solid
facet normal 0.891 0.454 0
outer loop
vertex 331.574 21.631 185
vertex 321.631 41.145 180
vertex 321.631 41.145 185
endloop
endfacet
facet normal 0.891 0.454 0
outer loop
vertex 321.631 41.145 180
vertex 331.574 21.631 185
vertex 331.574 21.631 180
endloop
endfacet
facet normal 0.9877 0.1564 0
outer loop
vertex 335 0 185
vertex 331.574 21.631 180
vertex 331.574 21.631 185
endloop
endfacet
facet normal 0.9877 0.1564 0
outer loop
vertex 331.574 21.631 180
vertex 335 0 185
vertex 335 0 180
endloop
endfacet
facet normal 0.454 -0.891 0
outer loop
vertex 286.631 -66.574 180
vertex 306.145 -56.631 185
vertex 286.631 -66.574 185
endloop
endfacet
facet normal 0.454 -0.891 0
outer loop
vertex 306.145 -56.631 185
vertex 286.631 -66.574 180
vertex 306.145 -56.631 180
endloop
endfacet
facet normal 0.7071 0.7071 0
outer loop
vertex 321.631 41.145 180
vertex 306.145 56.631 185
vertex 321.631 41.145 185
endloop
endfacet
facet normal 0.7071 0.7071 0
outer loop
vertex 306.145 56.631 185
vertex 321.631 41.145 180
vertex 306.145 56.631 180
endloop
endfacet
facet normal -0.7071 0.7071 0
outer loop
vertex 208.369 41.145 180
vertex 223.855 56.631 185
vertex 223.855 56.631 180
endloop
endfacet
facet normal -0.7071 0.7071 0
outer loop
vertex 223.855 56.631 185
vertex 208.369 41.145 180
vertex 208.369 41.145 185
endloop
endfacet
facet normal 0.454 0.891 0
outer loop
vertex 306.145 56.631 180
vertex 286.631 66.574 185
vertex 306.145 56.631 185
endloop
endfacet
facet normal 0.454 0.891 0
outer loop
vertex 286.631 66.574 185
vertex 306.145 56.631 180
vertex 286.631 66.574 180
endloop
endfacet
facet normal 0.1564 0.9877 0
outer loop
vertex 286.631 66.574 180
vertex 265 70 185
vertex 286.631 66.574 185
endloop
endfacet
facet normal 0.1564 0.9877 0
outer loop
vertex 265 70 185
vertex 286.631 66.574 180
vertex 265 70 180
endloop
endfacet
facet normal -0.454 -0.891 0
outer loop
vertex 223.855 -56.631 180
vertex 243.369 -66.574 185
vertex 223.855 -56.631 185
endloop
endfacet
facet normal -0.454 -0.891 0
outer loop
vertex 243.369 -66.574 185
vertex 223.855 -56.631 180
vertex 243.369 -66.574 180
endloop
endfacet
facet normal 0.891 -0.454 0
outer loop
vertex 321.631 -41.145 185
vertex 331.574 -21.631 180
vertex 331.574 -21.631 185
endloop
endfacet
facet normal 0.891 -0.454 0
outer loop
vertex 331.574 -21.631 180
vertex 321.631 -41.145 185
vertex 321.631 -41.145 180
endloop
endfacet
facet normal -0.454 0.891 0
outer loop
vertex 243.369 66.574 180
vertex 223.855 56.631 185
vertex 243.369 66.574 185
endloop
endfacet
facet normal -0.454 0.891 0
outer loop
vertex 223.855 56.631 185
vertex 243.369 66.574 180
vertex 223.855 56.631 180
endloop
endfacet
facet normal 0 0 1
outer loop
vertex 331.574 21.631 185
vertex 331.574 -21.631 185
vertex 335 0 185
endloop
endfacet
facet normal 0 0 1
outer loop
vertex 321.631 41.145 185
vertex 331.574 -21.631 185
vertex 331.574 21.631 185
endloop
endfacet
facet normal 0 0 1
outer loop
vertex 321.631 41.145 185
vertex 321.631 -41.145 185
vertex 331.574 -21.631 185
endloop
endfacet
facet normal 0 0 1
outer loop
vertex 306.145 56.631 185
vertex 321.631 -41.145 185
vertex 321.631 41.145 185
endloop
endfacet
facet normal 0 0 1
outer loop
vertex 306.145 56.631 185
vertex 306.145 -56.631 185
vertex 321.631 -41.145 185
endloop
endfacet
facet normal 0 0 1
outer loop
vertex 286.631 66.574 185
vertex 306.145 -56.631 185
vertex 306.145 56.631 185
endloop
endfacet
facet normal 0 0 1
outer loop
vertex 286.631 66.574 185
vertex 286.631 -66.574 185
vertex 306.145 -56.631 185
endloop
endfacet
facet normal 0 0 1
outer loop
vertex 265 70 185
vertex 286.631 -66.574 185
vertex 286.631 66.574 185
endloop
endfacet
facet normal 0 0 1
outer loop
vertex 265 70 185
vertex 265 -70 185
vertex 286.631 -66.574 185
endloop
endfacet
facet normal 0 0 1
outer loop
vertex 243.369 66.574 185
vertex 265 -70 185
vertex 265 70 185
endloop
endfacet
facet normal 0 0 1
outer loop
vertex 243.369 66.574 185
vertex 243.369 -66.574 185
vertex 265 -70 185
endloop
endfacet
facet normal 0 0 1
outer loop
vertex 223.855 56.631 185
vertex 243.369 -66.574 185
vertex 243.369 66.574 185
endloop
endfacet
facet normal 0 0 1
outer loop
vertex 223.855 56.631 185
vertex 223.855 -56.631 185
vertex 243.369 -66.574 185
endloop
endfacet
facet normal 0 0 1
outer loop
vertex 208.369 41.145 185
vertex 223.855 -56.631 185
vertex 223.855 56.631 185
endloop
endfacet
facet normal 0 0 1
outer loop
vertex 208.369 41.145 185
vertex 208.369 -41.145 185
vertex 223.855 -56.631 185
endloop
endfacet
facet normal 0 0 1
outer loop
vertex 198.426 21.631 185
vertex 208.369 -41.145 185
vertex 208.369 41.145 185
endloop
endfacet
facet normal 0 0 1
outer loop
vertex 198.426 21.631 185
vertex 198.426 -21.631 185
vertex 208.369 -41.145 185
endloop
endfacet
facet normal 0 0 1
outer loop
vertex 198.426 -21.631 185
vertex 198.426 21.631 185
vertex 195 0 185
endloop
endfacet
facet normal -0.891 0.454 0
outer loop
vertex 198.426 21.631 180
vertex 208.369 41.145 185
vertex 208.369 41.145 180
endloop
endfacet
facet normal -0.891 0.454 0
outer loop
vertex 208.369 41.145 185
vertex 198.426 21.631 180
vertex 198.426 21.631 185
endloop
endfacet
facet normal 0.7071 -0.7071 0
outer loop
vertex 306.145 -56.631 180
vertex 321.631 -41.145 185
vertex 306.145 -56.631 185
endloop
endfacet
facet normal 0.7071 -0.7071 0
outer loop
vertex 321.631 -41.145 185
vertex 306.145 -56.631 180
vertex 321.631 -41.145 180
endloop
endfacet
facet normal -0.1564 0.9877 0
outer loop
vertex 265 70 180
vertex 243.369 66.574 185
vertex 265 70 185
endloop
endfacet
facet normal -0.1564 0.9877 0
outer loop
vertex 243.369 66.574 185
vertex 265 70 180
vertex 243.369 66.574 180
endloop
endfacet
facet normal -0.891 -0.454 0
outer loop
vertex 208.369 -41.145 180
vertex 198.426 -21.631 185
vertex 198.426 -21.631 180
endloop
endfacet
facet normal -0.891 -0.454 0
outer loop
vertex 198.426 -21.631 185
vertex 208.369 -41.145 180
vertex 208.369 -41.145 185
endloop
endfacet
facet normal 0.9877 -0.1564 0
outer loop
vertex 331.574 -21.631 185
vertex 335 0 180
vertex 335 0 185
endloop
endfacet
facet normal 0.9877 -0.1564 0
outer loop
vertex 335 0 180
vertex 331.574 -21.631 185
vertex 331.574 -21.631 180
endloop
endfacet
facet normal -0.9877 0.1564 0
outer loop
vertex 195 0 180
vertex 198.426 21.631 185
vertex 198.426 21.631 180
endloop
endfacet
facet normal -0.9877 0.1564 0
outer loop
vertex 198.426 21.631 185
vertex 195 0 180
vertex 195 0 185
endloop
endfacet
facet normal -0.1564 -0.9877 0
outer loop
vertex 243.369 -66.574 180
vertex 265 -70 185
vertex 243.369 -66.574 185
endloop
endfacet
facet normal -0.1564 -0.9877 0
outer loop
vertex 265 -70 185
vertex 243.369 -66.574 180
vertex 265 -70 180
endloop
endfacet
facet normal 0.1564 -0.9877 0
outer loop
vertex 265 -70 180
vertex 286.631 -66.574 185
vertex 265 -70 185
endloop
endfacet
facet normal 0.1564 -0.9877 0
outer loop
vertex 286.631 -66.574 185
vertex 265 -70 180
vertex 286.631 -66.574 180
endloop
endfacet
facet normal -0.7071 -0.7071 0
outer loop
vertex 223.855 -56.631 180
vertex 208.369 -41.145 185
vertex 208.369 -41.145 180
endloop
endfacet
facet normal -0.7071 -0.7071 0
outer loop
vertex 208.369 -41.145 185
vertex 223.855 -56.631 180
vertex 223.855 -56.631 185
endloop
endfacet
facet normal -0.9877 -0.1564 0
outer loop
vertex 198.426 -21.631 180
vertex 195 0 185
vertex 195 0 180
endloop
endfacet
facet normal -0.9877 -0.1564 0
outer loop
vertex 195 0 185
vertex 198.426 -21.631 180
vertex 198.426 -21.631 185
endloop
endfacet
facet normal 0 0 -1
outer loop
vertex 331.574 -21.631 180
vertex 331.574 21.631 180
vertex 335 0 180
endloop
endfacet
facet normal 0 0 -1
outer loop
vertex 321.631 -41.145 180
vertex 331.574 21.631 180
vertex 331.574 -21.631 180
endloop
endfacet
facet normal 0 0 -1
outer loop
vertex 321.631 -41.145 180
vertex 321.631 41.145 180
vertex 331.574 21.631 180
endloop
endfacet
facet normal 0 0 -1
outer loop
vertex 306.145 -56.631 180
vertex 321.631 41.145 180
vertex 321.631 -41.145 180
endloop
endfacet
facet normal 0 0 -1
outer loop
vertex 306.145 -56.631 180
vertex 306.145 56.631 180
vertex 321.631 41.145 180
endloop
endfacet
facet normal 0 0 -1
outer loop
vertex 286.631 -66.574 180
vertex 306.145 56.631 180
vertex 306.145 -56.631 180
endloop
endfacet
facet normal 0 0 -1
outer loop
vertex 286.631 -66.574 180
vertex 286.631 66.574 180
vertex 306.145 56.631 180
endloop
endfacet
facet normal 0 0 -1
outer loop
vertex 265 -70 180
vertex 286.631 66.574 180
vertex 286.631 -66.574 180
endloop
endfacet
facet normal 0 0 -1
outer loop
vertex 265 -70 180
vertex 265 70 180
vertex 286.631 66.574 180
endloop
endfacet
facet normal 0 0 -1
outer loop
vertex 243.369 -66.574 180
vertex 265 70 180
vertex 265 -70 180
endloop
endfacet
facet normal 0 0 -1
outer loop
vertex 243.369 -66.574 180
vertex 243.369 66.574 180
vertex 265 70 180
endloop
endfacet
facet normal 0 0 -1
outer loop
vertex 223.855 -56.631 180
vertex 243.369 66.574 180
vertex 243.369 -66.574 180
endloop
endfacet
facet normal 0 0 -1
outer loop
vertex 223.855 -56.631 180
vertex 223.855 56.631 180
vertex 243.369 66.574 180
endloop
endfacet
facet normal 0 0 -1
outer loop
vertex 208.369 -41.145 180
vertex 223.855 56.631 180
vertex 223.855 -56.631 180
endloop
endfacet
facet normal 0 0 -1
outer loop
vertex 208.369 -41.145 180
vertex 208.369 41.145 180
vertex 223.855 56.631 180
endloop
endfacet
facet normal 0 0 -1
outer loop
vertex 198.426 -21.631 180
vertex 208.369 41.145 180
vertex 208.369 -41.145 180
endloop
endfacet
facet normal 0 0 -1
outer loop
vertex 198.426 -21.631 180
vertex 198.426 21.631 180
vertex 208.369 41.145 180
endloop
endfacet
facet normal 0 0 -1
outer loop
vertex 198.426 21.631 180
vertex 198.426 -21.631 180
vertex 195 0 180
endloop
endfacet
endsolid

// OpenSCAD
// file: variables.scad
// Pinya3 3D Food Printer
// file: variables.scad 
// author: Luis Rodriguez
// version: 0.1
// w3b: 3digitalcooks.com 

// Variables for all the project
// just numbers??
alpha = 0.7;

// PRINTING AREA
// from: https://www.marginallyclever.com/other/samples/fk-ik-test.html
// Base radius (f) = 100mm
// End Effector radius (e) = 30mm
// Bice length (rf) = 320mm
// Forearm length = 350mm
//X=-194.288 to 194.288 mm
//Y=-194.288 to 194.288 mm
//Z=-540.222 to -151.646 mm
printing_area_alpha = 0.2;
printing_area_x = 140*2;//195*2;
printing_area_y = 140*2;//195*2;
printing_area_z = 390 -110;//540-151;
printing_area_distance_from_motors_base = 110;//151
printing_area_x_displacement = 250/2 + 140;

// MOTORS BASE
motors_base_alpha = alpha;
motors_base_thickness = 5;
motors_base_rad = 70;

// FRAME 
frame_alpha = alpha;
frame_profile_width = 20;

frame_height = 400;
frame_width = 250;  // 250mm -> 7capsules~de 8cm
frame_lenght = 250;

// FOREARM 
forearm_alpha = alpha;
forearm_length = 220;
forearm_rad = 4;
forearm_motors_joint_rad = 50;

// DELTA BEAM
delta_beam_alpha = alpha;
delta_beam_length = printing_area_x_displacement 
                    + forearm_motors_joint_rad 
                    + frame_width/2;
echo("Delta beam lenght = ", delta_beam_length);
delta_beam_profile_width = frame_profile_width*2;
delta_beam_under_frame = 1; // 1 = Beam under frame or 0 = Beam on frame


// CAROUSEL
carousel_alpha = 0.3;
carousel_number_of_tools = 11;
carousel_offset_rotation = 0; // in degrees
carousel_rad = frame_width-20;//160;
carousel_tool_height = 180;
carousel_tool_rad = 40;
// main file
// Pinya3 3D Food Printer
// file: motors_base.scad 
// author: Luis Rodriguez
// version: 0.1
// w3b: 3digitalcooks.com

include <variables.scad>

// motors dimensions
//http://www.aliexpress.com/item/1-68A-Gear-ratio-5-1-Planetary-Gearbox-stepper-motor-Nema-17-Planetary-geared-stepper-3d/1794868710.html

motors_base();

module motors_base(){
  difference(){
    union(){ // Add
        motors_base_platform();
      }
    union(){ // Substract
      }
  }
}

module motors_base_platform() {
  color("RoyalBlue", motors_base_alpha)
  translate([printing_area_x_displacement, 0, 
            ((frame_height + motors_base_thickness)/2) 
            - delta_beam_under_frame*2*frame_profile_width
            + frame_profile_width
            ])
    cylinder(h = motors_base_thickness, 
             r = motors_base_rad, 
             center=true, $fn = 20);
}
